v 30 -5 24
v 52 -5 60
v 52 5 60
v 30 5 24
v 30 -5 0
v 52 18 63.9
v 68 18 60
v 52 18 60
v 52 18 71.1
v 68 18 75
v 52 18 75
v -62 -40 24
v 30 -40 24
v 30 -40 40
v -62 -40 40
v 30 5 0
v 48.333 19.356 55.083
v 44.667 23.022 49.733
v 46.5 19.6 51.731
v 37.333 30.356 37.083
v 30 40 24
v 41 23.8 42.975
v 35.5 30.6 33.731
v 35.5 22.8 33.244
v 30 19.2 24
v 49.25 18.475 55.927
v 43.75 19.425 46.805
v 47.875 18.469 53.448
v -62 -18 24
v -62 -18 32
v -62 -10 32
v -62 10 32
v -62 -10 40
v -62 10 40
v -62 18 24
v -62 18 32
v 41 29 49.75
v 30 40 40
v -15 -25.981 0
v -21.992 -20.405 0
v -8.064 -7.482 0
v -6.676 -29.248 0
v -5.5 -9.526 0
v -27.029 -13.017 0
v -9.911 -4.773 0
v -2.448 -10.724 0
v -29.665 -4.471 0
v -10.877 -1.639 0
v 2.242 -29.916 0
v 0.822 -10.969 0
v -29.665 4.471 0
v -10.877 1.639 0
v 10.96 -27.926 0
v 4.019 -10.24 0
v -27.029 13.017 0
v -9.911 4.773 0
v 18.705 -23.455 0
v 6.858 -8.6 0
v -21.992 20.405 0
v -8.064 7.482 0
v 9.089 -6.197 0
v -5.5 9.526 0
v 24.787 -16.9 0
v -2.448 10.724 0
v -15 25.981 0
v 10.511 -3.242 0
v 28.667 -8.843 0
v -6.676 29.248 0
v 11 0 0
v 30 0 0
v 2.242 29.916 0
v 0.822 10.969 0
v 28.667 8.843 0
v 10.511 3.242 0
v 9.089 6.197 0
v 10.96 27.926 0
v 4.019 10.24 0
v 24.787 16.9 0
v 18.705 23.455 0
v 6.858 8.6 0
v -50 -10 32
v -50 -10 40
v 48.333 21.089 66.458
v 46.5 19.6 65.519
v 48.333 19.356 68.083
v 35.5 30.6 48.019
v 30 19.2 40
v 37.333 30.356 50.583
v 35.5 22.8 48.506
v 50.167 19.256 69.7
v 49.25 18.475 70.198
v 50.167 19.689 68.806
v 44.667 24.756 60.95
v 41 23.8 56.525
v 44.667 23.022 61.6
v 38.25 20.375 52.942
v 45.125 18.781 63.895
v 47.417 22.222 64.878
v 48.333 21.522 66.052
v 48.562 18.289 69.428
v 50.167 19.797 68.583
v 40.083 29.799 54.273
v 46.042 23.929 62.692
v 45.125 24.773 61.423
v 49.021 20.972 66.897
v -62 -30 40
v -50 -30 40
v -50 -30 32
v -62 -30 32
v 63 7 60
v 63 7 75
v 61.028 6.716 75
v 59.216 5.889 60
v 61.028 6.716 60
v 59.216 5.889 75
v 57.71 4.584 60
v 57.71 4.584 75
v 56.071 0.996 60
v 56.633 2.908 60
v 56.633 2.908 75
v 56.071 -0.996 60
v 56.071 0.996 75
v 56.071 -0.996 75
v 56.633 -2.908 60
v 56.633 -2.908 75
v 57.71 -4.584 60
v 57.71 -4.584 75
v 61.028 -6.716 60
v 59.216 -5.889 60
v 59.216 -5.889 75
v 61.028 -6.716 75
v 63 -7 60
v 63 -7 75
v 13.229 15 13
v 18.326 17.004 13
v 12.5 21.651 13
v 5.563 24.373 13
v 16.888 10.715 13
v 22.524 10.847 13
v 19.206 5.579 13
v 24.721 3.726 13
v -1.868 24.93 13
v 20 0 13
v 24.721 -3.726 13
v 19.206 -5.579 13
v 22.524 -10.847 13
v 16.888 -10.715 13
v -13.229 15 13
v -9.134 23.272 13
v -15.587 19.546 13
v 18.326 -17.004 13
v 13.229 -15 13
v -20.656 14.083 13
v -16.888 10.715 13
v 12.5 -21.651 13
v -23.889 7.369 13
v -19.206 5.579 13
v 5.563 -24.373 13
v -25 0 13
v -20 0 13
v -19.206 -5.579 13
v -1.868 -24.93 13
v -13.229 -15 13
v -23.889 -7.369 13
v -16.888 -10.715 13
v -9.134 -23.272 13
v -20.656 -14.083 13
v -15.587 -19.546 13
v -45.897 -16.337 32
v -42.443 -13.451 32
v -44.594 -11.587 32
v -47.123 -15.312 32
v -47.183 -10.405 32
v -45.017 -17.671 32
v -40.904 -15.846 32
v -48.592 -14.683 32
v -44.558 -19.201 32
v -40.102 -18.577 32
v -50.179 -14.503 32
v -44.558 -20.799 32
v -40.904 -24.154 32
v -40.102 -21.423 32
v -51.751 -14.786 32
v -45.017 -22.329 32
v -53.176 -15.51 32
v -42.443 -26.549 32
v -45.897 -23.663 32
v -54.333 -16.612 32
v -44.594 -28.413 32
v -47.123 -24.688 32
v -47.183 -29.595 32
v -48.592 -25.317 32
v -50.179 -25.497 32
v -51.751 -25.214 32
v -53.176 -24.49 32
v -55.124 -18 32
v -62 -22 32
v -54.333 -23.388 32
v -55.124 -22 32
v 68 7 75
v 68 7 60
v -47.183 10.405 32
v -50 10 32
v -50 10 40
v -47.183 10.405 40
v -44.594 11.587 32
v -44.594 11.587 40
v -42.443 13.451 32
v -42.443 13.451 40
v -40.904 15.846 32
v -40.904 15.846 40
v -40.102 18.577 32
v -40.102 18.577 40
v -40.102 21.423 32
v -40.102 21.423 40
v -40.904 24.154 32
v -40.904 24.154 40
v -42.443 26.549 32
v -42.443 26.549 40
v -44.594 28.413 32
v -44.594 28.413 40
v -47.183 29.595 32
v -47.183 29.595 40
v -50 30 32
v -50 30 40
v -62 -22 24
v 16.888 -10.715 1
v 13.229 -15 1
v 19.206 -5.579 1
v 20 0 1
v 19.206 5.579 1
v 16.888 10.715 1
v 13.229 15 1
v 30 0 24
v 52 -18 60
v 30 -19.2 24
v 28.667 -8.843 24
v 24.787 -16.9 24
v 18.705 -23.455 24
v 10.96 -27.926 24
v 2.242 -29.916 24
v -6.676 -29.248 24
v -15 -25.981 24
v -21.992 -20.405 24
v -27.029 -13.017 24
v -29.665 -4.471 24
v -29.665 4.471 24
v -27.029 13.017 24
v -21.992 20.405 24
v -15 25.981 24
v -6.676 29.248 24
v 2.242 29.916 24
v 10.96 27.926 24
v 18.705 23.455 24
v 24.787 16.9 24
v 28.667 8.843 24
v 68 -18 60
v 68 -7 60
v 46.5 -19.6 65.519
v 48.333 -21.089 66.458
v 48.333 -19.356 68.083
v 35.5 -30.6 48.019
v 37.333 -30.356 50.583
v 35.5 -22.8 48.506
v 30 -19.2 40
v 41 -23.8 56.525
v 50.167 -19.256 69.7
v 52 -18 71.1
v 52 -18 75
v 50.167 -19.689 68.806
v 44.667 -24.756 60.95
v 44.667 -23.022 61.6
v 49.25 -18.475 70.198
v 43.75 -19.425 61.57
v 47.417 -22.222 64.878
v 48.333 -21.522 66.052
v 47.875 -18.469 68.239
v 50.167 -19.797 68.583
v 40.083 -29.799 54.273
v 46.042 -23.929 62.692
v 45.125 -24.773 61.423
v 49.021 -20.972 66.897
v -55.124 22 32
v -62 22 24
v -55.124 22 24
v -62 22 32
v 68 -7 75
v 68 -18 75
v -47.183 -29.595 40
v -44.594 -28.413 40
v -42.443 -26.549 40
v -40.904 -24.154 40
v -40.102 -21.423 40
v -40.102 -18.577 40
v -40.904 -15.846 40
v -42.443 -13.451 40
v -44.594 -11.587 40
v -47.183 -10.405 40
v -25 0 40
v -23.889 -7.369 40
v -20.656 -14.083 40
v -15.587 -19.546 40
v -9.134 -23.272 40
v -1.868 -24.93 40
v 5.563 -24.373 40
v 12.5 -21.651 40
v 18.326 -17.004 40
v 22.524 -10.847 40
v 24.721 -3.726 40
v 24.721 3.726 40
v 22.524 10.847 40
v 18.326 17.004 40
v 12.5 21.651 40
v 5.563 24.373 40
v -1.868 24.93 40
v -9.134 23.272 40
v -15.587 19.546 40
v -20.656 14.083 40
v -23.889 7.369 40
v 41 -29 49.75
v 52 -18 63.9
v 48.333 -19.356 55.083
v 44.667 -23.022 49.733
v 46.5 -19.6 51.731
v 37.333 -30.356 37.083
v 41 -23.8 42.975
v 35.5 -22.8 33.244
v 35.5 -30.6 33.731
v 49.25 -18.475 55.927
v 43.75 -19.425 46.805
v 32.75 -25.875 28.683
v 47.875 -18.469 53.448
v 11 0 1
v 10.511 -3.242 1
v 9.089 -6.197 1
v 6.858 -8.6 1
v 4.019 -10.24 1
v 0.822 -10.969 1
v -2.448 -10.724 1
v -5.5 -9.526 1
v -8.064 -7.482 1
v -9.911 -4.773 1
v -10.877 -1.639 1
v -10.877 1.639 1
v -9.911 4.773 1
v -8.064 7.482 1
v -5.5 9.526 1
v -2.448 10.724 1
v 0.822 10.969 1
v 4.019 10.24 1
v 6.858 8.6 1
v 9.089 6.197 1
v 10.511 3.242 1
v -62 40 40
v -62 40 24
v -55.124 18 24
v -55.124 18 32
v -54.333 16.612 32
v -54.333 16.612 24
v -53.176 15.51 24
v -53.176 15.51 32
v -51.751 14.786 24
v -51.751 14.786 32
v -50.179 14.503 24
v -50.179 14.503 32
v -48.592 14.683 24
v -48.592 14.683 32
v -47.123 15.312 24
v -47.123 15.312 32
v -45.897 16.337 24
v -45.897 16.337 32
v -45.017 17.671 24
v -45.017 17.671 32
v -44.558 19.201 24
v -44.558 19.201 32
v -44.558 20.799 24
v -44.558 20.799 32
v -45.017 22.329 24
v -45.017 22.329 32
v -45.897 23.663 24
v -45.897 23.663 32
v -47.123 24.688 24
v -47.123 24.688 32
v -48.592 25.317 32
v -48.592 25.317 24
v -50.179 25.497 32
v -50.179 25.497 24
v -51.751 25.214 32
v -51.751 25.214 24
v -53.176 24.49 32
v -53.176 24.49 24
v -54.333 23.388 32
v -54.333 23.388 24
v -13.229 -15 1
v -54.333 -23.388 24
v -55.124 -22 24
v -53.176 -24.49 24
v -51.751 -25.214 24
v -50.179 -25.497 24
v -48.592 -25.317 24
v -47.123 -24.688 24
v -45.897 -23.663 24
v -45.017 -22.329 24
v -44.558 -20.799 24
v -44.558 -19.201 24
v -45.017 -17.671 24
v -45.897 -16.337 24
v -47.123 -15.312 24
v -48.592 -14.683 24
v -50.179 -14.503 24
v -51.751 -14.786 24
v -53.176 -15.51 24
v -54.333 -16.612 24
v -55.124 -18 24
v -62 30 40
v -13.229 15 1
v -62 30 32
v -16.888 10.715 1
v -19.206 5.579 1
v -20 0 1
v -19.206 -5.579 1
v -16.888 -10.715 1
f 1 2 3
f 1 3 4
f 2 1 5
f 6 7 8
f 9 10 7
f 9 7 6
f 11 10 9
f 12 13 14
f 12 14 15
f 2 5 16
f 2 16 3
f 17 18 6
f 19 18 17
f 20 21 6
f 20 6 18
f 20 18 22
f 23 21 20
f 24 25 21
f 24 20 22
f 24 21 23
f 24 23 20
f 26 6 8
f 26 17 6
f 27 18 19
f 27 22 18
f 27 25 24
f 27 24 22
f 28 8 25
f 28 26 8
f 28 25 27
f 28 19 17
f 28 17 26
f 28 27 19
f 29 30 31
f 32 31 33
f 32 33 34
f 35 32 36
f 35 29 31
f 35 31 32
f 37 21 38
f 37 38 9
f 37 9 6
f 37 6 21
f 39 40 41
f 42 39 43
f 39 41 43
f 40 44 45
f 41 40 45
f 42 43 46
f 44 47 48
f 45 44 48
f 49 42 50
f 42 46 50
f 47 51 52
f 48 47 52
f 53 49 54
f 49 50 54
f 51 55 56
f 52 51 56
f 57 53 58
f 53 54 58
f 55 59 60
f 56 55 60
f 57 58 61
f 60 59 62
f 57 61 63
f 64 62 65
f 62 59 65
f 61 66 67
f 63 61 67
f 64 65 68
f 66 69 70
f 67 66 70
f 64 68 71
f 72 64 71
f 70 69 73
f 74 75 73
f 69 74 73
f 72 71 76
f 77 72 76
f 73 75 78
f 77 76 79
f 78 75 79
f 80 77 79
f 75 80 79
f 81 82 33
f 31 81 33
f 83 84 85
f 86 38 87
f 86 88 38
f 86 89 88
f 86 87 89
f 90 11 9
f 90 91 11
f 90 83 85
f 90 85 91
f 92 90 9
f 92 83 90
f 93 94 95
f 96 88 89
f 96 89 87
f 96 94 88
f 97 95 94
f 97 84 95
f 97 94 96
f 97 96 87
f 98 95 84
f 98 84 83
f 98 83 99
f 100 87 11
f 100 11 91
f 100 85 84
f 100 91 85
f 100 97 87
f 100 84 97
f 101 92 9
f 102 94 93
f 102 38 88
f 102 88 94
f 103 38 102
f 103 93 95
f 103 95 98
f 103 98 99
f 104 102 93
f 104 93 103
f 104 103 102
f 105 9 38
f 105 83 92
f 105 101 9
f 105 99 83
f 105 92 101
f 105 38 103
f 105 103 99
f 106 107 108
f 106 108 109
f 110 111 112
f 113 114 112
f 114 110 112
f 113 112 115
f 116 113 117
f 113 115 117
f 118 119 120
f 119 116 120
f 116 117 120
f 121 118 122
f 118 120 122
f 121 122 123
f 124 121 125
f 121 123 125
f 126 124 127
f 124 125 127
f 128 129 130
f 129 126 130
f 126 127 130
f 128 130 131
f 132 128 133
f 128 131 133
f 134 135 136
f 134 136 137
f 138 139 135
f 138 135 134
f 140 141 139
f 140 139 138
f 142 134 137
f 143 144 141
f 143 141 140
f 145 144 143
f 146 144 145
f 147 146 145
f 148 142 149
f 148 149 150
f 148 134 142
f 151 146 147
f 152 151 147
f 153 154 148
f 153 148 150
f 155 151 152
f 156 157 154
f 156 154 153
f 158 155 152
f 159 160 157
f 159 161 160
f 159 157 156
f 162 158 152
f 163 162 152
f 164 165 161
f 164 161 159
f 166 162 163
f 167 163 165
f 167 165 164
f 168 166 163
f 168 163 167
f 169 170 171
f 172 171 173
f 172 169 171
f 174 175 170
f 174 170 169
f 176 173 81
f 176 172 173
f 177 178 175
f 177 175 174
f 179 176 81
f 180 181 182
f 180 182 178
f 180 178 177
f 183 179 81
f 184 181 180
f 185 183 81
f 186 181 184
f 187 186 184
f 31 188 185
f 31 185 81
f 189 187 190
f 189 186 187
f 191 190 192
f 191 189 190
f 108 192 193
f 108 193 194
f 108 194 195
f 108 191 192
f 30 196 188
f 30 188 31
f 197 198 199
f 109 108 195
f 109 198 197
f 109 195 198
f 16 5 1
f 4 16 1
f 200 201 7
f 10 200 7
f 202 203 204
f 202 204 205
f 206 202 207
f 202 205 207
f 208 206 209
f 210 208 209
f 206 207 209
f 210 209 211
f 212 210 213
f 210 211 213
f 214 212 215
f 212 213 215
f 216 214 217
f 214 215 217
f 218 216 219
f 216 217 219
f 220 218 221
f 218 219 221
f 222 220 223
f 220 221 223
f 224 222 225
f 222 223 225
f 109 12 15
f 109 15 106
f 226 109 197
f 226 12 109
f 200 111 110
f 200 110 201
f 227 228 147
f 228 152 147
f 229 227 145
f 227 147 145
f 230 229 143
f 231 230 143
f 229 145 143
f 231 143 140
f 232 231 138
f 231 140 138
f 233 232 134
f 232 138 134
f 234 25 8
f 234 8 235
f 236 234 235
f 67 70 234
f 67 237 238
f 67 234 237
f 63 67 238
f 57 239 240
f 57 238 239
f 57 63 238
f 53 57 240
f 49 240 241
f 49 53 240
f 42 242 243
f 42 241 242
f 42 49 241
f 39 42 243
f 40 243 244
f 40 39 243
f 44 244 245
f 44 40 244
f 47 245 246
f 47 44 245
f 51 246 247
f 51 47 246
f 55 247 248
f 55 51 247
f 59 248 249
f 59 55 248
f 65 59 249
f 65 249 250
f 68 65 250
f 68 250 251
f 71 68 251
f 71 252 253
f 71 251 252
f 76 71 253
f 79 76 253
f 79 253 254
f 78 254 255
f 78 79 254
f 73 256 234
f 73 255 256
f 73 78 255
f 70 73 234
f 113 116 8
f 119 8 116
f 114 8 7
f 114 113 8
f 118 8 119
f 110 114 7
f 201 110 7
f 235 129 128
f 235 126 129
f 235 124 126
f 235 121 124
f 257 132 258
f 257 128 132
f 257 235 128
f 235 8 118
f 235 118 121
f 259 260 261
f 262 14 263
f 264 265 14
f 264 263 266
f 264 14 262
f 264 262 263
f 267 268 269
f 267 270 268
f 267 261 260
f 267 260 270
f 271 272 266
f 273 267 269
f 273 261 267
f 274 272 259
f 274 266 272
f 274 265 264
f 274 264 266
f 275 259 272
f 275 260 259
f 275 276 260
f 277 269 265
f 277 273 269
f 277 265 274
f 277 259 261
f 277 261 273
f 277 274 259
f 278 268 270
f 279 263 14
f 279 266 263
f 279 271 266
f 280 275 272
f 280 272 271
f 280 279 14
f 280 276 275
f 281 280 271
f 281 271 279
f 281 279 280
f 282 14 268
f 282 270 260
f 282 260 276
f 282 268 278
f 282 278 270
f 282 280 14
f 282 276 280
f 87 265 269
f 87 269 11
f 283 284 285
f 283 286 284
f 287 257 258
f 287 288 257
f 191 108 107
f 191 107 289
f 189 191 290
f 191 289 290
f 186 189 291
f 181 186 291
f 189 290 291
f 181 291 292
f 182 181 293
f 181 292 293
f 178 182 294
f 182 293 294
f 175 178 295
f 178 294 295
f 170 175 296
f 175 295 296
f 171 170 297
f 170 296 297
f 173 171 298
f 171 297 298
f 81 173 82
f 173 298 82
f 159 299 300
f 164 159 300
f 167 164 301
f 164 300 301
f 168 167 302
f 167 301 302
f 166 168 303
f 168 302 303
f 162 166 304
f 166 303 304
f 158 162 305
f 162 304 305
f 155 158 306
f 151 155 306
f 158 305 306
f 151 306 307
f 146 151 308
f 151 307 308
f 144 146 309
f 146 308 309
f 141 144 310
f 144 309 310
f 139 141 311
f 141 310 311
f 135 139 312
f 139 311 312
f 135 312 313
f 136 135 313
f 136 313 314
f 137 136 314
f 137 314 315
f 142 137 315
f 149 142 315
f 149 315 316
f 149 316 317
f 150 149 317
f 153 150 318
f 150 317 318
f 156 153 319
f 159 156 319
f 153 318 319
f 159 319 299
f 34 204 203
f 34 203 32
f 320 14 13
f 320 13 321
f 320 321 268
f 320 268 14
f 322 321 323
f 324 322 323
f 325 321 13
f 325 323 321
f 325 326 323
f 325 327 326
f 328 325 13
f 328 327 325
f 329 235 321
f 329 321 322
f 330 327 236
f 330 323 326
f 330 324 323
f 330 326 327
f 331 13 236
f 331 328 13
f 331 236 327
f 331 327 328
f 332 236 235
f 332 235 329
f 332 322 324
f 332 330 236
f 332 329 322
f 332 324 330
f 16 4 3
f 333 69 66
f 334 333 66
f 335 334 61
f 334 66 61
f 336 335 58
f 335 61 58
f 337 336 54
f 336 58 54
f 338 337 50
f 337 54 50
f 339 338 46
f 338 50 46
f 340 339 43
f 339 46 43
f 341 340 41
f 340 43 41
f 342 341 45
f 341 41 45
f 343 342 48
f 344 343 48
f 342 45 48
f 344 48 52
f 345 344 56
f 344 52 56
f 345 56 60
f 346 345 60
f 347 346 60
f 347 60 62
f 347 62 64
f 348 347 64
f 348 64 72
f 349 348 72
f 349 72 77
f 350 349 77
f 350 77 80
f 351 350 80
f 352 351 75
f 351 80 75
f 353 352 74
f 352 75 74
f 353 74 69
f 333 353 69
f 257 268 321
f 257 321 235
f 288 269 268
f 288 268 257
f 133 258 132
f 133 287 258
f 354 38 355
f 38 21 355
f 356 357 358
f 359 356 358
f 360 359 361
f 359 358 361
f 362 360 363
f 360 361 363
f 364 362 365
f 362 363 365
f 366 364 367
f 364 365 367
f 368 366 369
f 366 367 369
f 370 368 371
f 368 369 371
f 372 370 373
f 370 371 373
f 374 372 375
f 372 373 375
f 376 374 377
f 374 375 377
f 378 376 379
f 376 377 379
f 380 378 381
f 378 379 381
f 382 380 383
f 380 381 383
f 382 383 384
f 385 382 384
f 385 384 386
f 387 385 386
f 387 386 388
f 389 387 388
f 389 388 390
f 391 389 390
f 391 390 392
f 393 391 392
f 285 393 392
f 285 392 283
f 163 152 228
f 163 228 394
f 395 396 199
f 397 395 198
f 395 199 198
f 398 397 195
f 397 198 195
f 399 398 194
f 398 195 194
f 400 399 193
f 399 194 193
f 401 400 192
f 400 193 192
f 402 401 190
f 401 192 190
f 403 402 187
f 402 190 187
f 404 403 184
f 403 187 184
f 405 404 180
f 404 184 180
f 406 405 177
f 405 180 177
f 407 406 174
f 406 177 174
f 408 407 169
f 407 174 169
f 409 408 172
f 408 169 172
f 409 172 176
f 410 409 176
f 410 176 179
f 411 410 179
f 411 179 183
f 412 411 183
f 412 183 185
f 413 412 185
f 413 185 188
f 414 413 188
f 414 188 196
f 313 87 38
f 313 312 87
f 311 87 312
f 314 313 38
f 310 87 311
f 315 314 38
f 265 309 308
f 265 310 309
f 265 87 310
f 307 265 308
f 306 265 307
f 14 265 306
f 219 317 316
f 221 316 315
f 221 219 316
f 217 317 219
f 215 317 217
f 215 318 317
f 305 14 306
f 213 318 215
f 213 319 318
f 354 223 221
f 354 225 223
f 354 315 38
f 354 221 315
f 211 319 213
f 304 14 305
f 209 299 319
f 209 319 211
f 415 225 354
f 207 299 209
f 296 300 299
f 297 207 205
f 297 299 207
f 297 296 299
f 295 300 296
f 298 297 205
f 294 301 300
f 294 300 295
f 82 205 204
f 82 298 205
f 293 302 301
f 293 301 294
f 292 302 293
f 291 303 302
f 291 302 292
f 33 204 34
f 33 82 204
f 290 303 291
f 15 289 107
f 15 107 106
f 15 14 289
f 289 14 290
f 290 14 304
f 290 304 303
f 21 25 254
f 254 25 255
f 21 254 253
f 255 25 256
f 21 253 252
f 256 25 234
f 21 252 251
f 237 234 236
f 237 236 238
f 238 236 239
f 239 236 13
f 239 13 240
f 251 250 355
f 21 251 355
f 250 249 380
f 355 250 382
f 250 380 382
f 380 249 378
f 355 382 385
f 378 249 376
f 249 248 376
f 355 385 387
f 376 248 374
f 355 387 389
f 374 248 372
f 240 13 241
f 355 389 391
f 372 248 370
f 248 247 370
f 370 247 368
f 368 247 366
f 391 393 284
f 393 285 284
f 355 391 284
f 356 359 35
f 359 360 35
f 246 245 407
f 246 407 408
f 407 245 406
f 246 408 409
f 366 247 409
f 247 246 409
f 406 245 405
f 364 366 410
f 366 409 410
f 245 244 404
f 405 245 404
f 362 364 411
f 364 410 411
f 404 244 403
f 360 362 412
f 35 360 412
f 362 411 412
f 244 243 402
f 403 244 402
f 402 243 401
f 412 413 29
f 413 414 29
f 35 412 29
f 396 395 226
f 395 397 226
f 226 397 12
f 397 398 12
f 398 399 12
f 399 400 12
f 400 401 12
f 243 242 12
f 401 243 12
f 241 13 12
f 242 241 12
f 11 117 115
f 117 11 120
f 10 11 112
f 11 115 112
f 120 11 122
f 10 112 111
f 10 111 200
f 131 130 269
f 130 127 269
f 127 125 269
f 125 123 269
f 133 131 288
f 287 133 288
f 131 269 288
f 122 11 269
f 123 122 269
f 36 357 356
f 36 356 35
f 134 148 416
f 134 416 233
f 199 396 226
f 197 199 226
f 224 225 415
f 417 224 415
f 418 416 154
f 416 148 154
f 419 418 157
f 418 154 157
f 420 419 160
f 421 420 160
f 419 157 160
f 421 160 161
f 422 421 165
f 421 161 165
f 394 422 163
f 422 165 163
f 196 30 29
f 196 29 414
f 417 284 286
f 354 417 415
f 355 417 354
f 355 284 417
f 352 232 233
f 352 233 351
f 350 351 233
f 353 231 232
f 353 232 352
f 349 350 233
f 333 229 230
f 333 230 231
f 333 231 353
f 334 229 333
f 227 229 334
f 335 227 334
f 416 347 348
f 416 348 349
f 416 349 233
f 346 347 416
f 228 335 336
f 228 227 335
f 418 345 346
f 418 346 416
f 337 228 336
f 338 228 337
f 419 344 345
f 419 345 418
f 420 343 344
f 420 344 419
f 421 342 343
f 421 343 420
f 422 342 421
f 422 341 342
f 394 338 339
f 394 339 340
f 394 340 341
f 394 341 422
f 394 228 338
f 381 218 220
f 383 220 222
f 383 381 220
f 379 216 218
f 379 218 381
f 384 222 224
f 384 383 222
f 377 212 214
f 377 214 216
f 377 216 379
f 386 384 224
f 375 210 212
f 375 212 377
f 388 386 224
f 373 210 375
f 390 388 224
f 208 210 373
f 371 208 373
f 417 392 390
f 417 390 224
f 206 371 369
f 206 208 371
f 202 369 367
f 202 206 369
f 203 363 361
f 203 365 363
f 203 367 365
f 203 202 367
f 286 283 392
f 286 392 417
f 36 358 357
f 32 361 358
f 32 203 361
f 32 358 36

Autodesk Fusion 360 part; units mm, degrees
sketch "Sketch1" plane through (0, 0, 0) normal (0, 0, 1) x (1, 0, 0)
  circle A0 centre (0, 0) radius 30
extrude "Extrude1" add sketch "Sketch1" along normal blind 24 makes body 1
sketch "Sketch2" plane through (0, 0, 24) normal (0, 0, 1) x (-1, 0, 0)
  circle A0 centre (0, 0) radius 30
  line L0 (-30, 0) -> (-30, -40)
  line L1 (-30, -40) -> (-30, 0)
  line L2 (-30, 0) -> (-30, 40)
  line L3 (0, -40) -> (62, -40)
  line L4 (62, -40) -> (-30, -40)
  line L5 (-30, -40) -> (-30, 40)
  line L6 (-30, 40) -> (62, 40)
  line L7 (62, 40) -> (62, -40)
extrude "Extrude2" add sketch "Sketch2" along normal blind 16 contours A0 | L0 L1 L2 L3 L4 L5 L6 L7 bodies 1
sketch "Sketch3" plane through (0, 0, 40) normal (0, 0, 1) x (-1, 0, 0)
  line L0 (62, 40) -> (-30, 40)
  line L1 (-30, 40) -> (-30, -40)
  line L2 (-30, -40) -> (62, -40)
  line L3 (62, -40) -> (62, 40)
  line L4 (62, 0) -> (62, -20)
  line L5 (62, 0) -> (62, 20)
  line L6 (55.1235, 22) -> (62, 22)
  line L7 (62, 22) -> (62, 18)
  line L8 (62, 18) -> (55.1235, 18)
  line L9 (55.1235, -18) -> (62, -18)
  line L10 (62, -18) -> (62, -22)
  line L11 (62, -22) -> (55.1235, -22)
  arc A0 (59.798, -18) -> (59.798, -22) centre (50, -20) ccw
  arc A1 (55.1235, -18) -> (55.1235, -22) centre (50, -20) ccw
  arc A2 (59.798, 22) -> (59.798, 18) centre (50, 20) ccw
  arc A3 (55.1235, 22) -> (55.1235, 18) centre (50, 20) ccw
  point P0 (62, 0)
extrude "Extrude3" cut sketch "Sketch3" against normal blind 123 contours L3 L5 L6 L7 L8 A3 | L3 L4 L9 L10 L11 A1 bodies 1
sketch "Sketch4" plane through (0, 0, 40) normal (0, 0, 1) x (-1, 0, 0)
  line L0 (55.1235, 22) -> (62, 22)
  line L1 (62, 22) -> (62, 40)
  line L2 (62, 40) -> (-30, 40)
  line L3 (-30, 40) -> (-30, -40)
  line L4 (-30, -40) -> (62, -40)
  line L5 (62, -40) -> (62, -22)
  line L6 (62, -22) -> (55.1235, -22)
  arc A0 (55.1235, -18) -> (55.1235, -22) centre (50, -20) ccw
  line L7 (55.1235, -18) -> (62, -18)
  line L8 (62, -18) -> (62, 18)
  line L9 (62, 18) -> (55.1235, 18)
  arc A1 (55.1235, 22) -> (55.1235, 18) centre (50, 20) ccw
  circle A2 centre (50, -20) radius 10
  circle A3 centre (50, 20) radius 10
  line L10 (50, -30) -> (50, -10)
  line L11 (50, 30) -> (50, 10)
  line L12 (50, -30) -> (62, -30)
  line L13 (50, -10) -> (62, -10)
  line L14 (50, 10) -> (62, 10)
  line L15 (50, 30) -> (62, 30)
  dimension "d25" = 20
  dimension "d26" = 20
extrude "Extrude4" cut sketch "Sketch4" against normal blind 8 contours L0 A1 A3 L11 | L0 L1 A3 L15 | A1 A3 L11 | L9 A1 A3 L11 | L8 L9 A3 L14 | L7 L8 A2 L13 | A0 A2 L10 | A0 L7 A2 L10 | L6 A0 A2 L10 | L5 L6 A2 L12 bodies 1
sketch "Sketch5" plane through (0, -40, 0) normal (0, -1, 0) x (1, 0, 0)
  line L0 (-62, 24) -> (30, 24)
  line L1 (30, 24) -> (30, 40)
  line L2 (30, 40) -> (-62, 40)
  line L3 (-62, 40) -> (-62, 24)
  line L4 (52, 55) -> (52, 70)
  line L5 (52, 70) -> (52, 55)
  line L6 (30, 40) -> (52, 70)
  line L7 (30, 24) -> (52, 55)
sketch "Sketch6" plane through (0, 40, 0) normal (0, 1, 0) x (-1, 0, 0)
  line L0 (-30, 24) -> (62, 24)
  line L1 (62, 24) -> (62, 40)
  line L2 (62, 40) -> (-30, 40)
  line L3 (-30, 40) -> (-30, 24)
  line L4 (62, 24) -> (-52, 24)
  line L5 (-52, 24) -> (-52, 26)
  line L6 (-52, 26) -> (-30, 26)
  line L7 (-30, 24) -> (-30, 26)
  dimension "d34" = 114
  dimension "d35" = 2
ref_plane "WorkPlane3" through (0, 0, 75) normal (0, 0, -1) x (-1, 0, 0)
sketch "Sketch23" plane through (0, 0, 75) normal (0, 0, -1) x (1, 0, 0)
  line L0 (-62, -30) -> (-50, -30) construction
  arc A0 (-50, -30) -> (-50, -10) centre (-50, -20) ccw construction
  line L1 (-50, -10) -> (-62, -10) construction
  line L2 (-62, -10) -> (-62, 10) construction
  line L3 (-62, 10) -> (-50, 10) construction
  arc A1 (-50, 10) -> (-50, 30) centre (-50, 20) ccw construction
  line L4 (-50, 30) -> (-62, 30) construction
  line L5 (-62, 30) -> (-62, 40) construction
  line L6 (-62, 40) -> (30, 40) construction
  line L7 (30, 40) -> (30, -40) construction
  line L8 (30, -40) -> (-62, -40) construction
  line L9 (-62, -40) -> (-62, -30) construction
  line L10 (-62, 0) -> (68, 0) construction
  line L11 (68, 0) -> (52, 0) construction
  line L12 (52, 0) -> (52, -18) construction
  line L13 (52, -18) -> (52, 18) construction
  line L14 (68, -18) -> (52, -18)
  line L15 (52, -18) -> (52, 18)
  line L16 (52, 18) -> (68, 18)
  line L17 (68, 18) -> (68, -18)
  line L18 (68, -18) -> (52, 18) construction
  line L19 (52, -18) -> (68, 18) construction
  circle A2 centre (0, 0) radius 30 construction
  line L20 (0, 0) -> (63, 0) construction
  line L21 (63, -7) -> (77.3975, -7)
  arc A3 (77.3975, -7) -> (77.3975, 7) centre (77.3975, 0) ccw
  line L22 (77.3975, 7) -> (63, 7)
  arc A4 (63, 7) -> (63, -7) centre (63, 0) ccw
  line L23 (63, 0) -> (77.3975, 0) construction
  point P0 (60, 0)
  dimension "d68" = 130
  dimension "d69" = 16
  dimension "d72" = 16
  dimension "d73" = 36
  dimension "d74" = 63
  dimension "d75" = 14
extrude "Extrude15" add sketch "Sketch23" along normal blind 15 separate body contours L14 L15 L16 L17 L21 L22 A4 makes body 2
loft "Loft1" add section 1 face at (52, 6, 70) section 2 face at (30, 0, 34.6667) on bodies 1 2 bodies 2 1
sketch "Sketch24" plane through (0, 0, 0) normal (0, 1, 0) x (1, 0, 0)
  line L0 (52, -75) -> (30, -40)
  line L1 (52, -60) -> (30, -24)
  line L2 (-62, -40) -> (30, -40)
  line L3 (-62, -24) -> (-62, -40)
  line L4 (-30, -24) -> (-62, -24)
  line L5 (-30, 0) -> (30, 0)
  line L6 (52, -75) -> (68, -75)
  line L7 (68, -60) -> (52, -60)
  line L8 (68, -75) -> (68, -60)
  line L9 (-30, 0) -> (-30, -24)
  line L10 (30, 0) -> (30, -24)
  line L11 (30, 0) -> (52, -60)
extrude "Extrude16" add sketch "Sketch24" along normal mid plane 10 separate body contours L1 L10 L11 makes body 3
sketch "Sketch25" plane through (0, 0, 0) normal (0, 0, -1) x (1, 0, 0)
  circle A0 centre (0, 0) radius 30
sketch "Sketch14" plane through (0, 0, 40) normal (0, 0, 1) x (-1, 0, 0)
  line L0 (62, -30) -> (50, -30)
  arc A0 (50, -10) -> (50, -30) centre (50, -20) ccw
  line L1 (50, -10) -> (62, -10)
  line L2 (62, -10) -> (62, 10)
  line L3 (62, 10) -> (50, 10)
  arc A1 (50, 30) -> (50, 10) centre (50, 20) ccw
  line L4 (50, 30) -> (62, 30)
  line L5 (62, 30) -> (62, 40)
  line L6 (62, 40) -> (-30, 40)
  line L7 (-30, -40) -> (62, -40)
  circle A2 centre (0, 0) radius 25
  line L8 (-30, 40) -> (-30, -40)
  line L9 (62, -40) -> (62, -30)
  dimension "d53" = 50
extrude "Extrude12" cut sketch "Sketch14" against normal blind 27 contours A2 bodies 2
sketch "Sketch15" plane through (0, 0, 0) normal (0, 0, -1) x (1, 0, 0)
  circle A0 centre (0, 0) radius 30
  circle A1 centre (0, 0) radius 11
  dimension "d56" = 22
sketch "Sketch16" plane through (0, 0, 13) normal (0, 0, 1) x (-1, 0, 0)
  circle A0 centre (0, 0) radius 25
  line L0 (0, 0) -> (0, -15)
  line L1 (0, -15) -> (0, 0)
  line L2 (0, 0) -> (0, 15)
  line L3 (0, -15) -> (-13.2288, -15)
  line L4 (13.2288, -15) -> (0, -15)
  line L5 (0, 15) -> (-13.2288, 15)
  line L6 (0, 15) -> (13.2288, 15)
  arc A1 (13.2288, -15) -> (13.2288, 15) centre (0, 0) ccw
  arc A2 (-13.2288, 15) -> (-13.2288, -15) centre (0, 0) ccw
extrude "Extrude14" cut sketch "Sketch16" against normal blind 12 contours L0 L1 L2 L4 L6 A1 | L0 L1 L2 L3 L5 A2 bodies 2
extrude "Extrude13" cut sketch "Sketch15" against normal blind 45 contours A1 bodies 2
